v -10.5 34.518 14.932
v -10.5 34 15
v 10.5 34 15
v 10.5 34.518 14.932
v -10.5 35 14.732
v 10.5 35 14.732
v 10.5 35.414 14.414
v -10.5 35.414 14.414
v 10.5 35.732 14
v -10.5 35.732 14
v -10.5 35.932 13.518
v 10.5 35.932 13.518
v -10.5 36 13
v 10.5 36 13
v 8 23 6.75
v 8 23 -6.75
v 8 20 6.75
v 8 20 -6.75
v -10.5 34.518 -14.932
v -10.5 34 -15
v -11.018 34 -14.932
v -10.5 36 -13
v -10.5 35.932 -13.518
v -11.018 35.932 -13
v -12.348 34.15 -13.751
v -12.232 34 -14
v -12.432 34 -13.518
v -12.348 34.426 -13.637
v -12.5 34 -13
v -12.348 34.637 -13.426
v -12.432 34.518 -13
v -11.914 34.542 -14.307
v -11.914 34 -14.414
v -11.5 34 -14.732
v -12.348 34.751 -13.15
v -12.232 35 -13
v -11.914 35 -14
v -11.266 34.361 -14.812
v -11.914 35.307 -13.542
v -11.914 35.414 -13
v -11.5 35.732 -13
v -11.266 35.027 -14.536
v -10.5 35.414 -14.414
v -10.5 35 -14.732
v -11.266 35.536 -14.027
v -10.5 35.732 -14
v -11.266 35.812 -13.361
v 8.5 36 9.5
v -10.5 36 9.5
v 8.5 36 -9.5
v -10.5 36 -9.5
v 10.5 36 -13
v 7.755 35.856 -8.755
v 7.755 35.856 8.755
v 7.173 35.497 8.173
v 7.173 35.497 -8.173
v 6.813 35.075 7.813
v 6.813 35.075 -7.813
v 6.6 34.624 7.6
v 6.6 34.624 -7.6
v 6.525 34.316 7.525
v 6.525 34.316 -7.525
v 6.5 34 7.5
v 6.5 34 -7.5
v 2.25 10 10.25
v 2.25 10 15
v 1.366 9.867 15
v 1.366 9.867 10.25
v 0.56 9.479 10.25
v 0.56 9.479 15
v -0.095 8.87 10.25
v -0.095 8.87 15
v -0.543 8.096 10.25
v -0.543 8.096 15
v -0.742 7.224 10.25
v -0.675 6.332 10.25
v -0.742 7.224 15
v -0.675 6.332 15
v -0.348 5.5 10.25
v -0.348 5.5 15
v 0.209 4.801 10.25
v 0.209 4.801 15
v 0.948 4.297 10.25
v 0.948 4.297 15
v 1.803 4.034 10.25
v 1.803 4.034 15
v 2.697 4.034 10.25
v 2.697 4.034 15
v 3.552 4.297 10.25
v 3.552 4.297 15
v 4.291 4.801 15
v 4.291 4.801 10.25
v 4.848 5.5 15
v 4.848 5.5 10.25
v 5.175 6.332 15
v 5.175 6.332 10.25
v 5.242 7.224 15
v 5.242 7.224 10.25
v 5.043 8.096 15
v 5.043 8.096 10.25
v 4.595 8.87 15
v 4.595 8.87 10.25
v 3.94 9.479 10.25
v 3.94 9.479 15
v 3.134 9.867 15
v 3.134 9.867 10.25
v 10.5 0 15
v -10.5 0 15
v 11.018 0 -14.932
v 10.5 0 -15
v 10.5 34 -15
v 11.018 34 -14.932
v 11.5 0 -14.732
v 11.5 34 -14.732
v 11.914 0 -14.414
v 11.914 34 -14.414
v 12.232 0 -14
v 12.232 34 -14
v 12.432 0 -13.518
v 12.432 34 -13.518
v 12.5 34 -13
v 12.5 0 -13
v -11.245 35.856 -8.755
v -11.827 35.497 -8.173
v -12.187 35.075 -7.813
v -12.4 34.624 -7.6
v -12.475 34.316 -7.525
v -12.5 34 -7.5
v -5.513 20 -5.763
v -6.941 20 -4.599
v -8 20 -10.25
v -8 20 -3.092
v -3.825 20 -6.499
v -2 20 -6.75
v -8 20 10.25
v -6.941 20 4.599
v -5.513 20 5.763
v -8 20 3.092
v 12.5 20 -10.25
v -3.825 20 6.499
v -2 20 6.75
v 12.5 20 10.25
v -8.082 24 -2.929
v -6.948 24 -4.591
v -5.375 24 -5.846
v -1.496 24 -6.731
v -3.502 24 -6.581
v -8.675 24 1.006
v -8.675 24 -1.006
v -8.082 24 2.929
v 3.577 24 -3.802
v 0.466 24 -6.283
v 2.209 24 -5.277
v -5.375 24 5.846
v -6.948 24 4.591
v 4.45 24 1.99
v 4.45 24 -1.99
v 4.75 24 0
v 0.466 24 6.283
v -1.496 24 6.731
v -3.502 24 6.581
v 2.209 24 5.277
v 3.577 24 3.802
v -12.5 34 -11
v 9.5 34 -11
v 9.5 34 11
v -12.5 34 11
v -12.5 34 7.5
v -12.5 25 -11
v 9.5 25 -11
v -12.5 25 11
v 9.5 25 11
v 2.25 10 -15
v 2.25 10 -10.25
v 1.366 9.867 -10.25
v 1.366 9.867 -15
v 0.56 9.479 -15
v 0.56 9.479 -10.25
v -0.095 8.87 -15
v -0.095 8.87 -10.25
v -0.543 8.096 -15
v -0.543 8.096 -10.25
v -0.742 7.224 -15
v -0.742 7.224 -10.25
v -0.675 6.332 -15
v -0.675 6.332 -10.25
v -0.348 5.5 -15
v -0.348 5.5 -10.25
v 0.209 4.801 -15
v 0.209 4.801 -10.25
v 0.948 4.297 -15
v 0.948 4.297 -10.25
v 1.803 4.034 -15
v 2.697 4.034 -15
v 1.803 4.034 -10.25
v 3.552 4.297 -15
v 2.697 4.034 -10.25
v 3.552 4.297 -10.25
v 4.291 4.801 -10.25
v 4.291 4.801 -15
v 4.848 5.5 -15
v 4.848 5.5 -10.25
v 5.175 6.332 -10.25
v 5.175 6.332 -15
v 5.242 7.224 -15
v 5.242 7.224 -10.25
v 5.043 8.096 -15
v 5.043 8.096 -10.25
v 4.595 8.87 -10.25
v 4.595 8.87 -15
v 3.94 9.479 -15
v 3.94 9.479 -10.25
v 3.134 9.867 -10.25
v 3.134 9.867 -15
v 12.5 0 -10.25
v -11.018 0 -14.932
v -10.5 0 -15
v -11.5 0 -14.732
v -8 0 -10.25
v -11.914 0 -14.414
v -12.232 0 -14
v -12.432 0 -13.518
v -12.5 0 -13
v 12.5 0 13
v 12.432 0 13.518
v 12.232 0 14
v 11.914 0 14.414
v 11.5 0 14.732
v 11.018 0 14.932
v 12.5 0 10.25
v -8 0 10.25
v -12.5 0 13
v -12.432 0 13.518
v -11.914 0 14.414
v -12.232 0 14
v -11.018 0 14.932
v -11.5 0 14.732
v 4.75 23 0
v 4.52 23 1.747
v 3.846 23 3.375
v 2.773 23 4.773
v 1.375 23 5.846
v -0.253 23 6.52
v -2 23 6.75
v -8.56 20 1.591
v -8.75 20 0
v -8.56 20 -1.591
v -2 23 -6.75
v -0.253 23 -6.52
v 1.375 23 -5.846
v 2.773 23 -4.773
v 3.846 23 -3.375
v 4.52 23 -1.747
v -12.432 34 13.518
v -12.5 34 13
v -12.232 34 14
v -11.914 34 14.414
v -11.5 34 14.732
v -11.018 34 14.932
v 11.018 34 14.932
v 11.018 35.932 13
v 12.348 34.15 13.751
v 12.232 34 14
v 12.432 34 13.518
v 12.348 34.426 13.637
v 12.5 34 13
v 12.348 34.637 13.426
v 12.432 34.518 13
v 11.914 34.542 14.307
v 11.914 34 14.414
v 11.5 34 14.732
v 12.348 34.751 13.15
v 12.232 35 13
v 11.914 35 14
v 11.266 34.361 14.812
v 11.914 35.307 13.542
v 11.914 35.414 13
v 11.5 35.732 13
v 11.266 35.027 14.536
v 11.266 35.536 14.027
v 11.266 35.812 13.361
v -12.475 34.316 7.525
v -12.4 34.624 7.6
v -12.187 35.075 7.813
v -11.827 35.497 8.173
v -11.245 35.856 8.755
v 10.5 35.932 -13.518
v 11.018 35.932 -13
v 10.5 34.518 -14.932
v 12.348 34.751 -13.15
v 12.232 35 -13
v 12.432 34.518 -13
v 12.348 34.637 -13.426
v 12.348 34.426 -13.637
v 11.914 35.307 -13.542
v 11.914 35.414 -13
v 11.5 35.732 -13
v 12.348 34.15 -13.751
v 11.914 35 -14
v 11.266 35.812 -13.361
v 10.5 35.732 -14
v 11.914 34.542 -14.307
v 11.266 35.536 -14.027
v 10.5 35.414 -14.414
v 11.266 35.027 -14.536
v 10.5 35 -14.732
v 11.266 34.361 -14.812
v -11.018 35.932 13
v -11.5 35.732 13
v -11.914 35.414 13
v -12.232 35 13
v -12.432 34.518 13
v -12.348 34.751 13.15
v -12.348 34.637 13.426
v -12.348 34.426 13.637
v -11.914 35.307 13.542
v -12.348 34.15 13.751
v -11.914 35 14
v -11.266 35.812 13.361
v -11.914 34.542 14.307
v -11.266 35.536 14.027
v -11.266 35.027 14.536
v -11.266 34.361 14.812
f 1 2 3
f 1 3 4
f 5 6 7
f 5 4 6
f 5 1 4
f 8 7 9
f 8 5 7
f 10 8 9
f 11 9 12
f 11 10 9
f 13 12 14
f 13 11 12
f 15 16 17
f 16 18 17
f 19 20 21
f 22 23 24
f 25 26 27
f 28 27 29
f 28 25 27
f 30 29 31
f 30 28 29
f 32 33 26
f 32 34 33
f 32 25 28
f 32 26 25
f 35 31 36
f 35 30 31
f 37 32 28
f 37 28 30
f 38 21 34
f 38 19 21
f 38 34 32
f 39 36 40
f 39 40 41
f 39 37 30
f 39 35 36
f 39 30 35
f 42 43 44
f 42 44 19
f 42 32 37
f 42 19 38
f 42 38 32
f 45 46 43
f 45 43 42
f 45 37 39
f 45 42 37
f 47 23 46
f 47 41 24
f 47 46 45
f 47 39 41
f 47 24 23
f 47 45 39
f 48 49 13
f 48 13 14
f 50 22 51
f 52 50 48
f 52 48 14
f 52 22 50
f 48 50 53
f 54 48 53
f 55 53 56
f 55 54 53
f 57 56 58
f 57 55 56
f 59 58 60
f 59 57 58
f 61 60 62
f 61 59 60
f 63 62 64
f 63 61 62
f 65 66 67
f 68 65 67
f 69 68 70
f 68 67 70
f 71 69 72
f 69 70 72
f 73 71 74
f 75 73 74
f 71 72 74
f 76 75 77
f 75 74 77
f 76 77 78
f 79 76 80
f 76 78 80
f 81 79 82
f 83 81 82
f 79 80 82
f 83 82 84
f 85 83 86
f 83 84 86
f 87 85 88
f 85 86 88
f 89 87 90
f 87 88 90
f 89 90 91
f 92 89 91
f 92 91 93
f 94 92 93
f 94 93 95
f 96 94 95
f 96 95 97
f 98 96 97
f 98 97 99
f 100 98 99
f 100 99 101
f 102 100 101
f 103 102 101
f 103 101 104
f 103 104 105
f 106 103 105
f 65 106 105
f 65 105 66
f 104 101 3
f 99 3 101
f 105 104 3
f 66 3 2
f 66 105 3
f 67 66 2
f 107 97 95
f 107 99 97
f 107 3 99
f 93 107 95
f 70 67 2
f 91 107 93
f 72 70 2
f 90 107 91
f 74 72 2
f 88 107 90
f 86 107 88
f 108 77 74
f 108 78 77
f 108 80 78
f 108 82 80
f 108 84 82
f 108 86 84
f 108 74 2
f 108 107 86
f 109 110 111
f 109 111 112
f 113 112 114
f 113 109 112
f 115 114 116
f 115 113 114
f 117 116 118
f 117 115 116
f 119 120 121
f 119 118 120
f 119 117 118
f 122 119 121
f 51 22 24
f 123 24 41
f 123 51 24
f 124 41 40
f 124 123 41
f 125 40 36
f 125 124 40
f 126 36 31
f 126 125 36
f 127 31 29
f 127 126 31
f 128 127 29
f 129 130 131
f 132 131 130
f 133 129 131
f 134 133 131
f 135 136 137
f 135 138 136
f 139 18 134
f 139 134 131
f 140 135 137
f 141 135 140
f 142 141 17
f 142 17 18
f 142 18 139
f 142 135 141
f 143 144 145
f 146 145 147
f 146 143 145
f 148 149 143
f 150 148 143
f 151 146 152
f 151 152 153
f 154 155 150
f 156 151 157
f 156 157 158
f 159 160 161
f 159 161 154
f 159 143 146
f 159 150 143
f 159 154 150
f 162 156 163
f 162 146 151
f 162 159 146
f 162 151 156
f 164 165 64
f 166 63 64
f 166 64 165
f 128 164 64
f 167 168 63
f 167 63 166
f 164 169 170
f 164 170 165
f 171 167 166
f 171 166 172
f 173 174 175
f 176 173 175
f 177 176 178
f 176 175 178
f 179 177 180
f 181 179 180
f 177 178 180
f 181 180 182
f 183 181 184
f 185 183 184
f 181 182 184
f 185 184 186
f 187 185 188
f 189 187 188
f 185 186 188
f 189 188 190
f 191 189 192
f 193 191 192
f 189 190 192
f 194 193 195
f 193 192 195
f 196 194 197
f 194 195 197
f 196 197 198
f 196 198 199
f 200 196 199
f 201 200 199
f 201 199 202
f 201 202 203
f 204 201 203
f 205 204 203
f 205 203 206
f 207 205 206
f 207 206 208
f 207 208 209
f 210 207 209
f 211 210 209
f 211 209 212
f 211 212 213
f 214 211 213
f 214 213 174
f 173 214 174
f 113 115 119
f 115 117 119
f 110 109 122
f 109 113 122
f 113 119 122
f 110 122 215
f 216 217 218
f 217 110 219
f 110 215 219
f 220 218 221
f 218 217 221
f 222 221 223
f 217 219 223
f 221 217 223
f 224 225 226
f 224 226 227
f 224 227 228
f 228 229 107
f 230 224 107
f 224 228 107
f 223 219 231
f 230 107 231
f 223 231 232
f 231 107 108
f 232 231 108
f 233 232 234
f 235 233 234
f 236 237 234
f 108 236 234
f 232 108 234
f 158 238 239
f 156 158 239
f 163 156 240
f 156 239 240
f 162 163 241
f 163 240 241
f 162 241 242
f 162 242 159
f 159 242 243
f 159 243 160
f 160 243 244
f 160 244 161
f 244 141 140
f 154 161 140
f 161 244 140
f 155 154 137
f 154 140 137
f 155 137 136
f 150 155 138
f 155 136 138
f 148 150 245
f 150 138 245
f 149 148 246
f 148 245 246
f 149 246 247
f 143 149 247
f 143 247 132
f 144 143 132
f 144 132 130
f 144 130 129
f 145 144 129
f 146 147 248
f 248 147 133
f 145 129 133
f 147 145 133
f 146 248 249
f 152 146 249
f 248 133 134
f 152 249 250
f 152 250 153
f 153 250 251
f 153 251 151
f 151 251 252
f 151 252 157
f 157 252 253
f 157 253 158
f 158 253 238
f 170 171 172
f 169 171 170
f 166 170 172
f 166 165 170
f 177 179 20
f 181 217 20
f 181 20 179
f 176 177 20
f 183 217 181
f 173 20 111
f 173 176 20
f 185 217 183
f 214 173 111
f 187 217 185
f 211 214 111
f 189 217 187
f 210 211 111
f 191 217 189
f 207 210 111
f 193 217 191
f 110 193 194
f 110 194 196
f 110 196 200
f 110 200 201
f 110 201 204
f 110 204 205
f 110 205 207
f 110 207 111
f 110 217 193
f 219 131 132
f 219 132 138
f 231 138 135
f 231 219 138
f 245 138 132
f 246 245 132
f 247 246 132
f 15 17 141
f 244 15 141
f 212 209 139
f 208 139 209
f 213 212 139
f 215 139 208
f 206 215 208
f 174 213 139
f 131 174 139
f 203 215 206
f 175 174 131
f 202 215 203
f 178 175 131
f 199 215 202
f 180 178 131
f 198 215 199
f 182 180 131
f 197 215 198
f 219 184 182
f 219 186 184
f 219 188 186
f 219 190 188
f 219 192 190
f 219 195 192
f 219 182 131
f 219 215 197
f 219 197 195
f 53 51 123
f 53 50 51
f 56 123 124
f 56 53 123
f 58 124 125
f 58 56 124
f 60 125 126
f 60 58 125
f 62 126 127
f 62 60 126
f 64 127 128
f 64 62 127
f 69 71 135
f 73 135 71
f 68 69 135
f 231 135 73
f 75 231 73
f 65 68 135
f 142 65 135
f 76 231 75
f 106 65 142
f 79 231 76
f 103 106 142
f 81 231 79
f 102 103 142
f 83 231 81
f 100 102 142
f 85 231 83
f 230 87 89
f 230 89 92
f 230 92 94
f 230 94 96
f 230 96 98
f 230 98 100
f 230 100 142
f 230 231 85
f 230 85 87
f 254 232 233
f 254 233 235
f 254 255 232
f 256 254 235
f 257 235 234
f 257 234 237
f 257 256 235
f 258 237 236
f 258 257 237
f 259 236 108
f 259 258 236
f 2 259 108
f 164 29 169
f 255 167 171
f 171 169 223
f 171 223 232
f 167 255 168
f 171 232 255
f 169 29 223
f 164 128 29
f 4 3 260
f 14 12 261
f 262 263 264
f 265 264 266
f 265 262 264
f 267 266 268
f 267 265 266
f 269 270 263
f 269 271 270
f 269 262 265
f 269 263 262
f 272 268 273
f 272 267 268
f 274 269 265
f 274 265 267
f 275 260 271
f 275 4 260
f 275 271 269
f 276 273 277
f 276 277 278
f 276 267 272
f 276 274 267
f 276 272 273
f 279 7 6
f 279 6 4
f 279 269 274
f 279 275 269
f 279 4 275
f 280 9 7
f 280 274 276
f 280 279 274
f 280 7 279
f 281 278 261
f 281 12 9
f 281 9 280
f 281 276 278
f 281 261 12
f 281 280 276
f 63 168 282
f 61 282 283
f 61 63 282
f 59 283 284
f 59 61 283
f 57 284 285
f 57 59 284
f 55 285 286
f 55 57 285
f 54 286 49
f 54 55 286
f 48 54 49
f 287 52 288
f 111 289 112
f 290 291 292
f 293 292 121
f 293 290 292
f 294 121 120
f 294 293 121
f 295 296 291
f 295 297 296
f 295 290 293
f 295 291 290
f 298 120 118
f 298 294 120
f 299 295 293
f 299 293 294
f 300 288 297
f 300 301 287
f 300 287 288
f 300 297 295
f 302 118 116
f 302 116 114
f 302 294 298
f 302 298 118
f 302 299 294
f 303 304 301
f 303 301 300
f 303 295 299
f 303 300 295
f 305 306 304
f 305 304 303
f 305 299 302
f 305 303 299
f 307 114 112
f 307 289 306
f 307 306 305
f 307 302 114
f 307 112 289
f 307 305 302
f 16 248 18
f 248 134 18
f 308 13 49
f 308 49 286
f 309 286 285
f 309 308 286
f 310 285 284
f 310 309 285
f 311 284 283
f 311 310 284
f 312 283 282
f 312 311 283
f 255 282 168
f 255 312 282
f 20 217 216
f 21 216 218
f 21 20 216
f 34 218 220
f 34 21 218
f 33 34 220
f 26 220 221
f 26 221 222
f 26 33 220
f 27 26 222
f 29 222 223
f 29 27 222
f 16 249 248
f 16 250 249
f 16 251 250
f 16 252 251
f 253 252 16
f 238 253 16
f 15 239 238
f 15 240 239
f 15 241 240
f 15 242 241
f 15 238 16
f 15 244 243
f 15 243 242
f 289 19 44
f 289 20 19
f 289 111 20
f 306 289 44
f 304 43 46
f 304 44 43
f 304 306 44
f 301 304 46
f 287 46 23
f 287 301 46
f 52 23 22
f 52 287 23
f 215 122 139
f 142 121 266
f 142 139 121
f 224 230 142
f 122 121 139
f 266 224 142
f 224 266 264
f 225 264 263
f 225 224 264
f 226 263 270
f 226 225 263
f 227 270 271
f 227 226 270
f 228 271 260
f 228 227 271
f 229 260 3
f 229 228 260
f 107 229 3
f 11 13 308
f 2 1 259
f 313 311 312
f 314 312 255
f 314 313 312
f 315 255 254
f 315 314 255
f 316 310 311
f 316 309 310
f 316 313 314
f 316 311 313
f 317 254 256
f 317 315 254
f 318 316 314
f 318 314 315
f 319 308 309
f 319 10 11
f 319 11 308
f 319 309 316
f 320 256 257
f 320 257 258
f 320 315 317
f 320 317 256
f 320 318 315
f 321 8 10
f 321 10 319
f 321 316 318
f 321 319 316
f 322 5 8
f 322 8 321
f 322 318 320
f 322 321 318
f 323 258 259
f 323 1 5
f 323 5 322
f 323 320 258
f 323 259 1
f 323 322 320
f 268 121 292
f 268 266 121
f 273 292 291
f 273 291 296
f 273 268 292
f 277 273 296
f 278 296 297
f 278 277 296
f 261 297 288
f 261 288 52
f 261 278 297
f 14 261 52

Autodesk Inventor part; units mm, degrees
ref_plane "YZ Plane" through (0, 0, 0) normal (1, 0, 0) x (0, 1, 0)
ref_plane "XZ Plane" through (0, 0, 0) normal (0, 1, 0) x (-1, 0, 0)
ref_plane "XY Plane" through (0, 0, 0) normal (0, 0, 1) x (1, 0, 0)
sketch "スケッチ1" plane through (0, 0, 0) normal (0, 1, 0) x (-1, 0, 0)
  line L0 (-12.5, -15) -> (12.5, -15)
  line L1 (12.5, -15) -> (12.5, 15)
  line L2 (12.5, 15) -> (-12.5, 15)
  line L3 (-12.5, 15) -> (-12.5, -15)
  line L4 (-12.5, -15) -> (12.5, 15) construction
  line L5 (12.5, -15) -> (-12.5, 15) construction
  point P0 (0, 0)
  dimension "d0" = 25
  dimension "d1" = 30
extrude "押し出し1" add sketch "スケッチ1" along normal blind 25
sketch "スケッチ2" plane through (0, 0, 0) normal (0, -1, 0) x (1, 0, 0)
  line L0 (12.5, 15) -> (12.5, -15) projected
  line L1 (12.5, -10.25) -> (-8, -10.25)
  line L2 (-8, -10.25) -> (-8, 10.25)
  line L3 (-8, 10.25) -> (12.5, 10.25)
  line L4 (12.5, 10.25) -> (12.5, -10.25)
  line L5 (12.5, -15) -> (-12.5, -15) projected
  point P0 (0, 0)
  point P1 (12.5, 10.25)
  dimension "d4" = 20.5
  dimension "d5" = 20.5
  dimension "d22" = 10.25
extrude "押し出し2" cut sketch "スケッチ2" against normal blind 20
sketch "スケッチ4" plane through (12.5, 0, -15) normal (0, 0, -1) x (-1, 0, 0)
  line L0 (0, 0) -> (25, 0) projected
  line L1 (0, 0) -> (0, 25) projected
  point P0 (12.5, 0)
  point P1 (10.25, 7)
  dimension "d12" = 7
  dimension "d13" = 10.25
hole "穴1" at (2.25, 7, -15) direction (0, 0, 1) diameter 6 end through all
sketch "スケッチ5" plane through (0, 20, 0) normal (0, -1, 0) x (1, 0, 0)
  circle A0 centre (-2, 0) radius 6.75
  line L0 (12.5, 10.25) -> (12.5, -10.25) projected
  line L1 (-8, 10.25) -> (12.5, 10.25) projected
  line L2 (-12.5, -15) -> (-12.5, 15) projected
  point P0 (0, 0)
  dimension "d24" = 13.5
  dimension "d26" = 10.25
  dimension "d49" = 10.5
extrude "押し出し4" cut sketch "スケッチ5" against normal blind 4
sketch "スケッチ6" plane through (0, 25, 0) normal (0, 1, 0) x (1, 0, 0)
  line L0 (-12.5, 15) -> (-12.5, -15) projected
  line L1 (12.5, -15) -> (12.5, -10.25) projected
  line L2 (-12.5, 15) -> (12.5, 15)
  line L3 (12.5, 15) -> (12.5, -15)
  line L4 (12.5, -15) -> (-12.5, -15)
  line L5 (-12.5, -15) -> (-12.5, 15)
  point P0 (0, 0)
extrude "押し出し5" add sketch "スケッチ6" along normal blind 11
sketch "スケッチ8" plane through (-12.5, 0, -15) normal (-1, 0, 0) x (0, 0, 1)
  point P0 (15, 0)
sketch "スケッチ9" plane through (-12.5, 0, -15) normal (-1, 0, 0) x (0, 0, 1)
  line L0 (4, 34) -> (26, 34)
  line L1 (26, 34) -> (26, 25)
  line L2 (26, 25) -> (4, 25)
  line L3 (4, 25) -> (4, 34)
  line L4 (0, 36) -> (30, 36) projected
  point P0 (15, 0)
  dimension "d37" = 22
  dimension "d38" = 9
  dimension "d39" = 2
  dimension "d40" = 11
extrude "押し出し7" cut sketch "スケッチ9" against normal blind 22
sketch "スケッチ10" plane through (-12.5, 0, -15) normal (-1, 0, 0) x (0, 0, 1)
  line L0 (7.5, 36) -> (22.5, 36)
  line L1 (22.5, 36) -> (22.5, 34)
  line L2 (22.5, 34) -> (7.5, 34)
  line L3 (7.5, 34) -> (7.5, 36)
  line L4 (0, 36) -> (30, 36) projected
  point P0 (15, 0)
  dimension "d43" = 15
  dimension "d44" = 2
  dimension "d45" = 0
  dimension "d46" = 7.5
extrude "押し出し8" cut sketch "スケッチ10" against normal blind 19
sketch "スケッチ12" plane through (0, 20, 0) normal (0, -1, 0) x (1, 0, 0)
  circle A0 centre (-2, 0) radius 6.75 projected
  line L0 (-2, 6.75) -> (-2, -6.75)
  line L1 (-2, -6.75) -> (8, -6.75)
  line L2 (8, -6.75) -> (8, 6.75)
  line L3 (8, 6.75) -> (-2, 6.75)
  point P0 (0, 0)
  dimension "d50" = 10
extrude "押し出し9" cut sketch "スケッチ12" against normal blind 3 contours A0 L3 L2 L1
fillet "フィレット3" radius 2 12 edges at (0, 36, -15) (-3, 36, -7.5) (-12.5, 36, -11.25) (6.5, 36, 0) (-3, 36, 7.5) (0, 36, 15) (-12.5, 36, 11.25) (12.5, 36, 0) (12.5, 18, -15) (12.5, 18, 15) (-12.5, 18, 15) (-12.5, 18, -15)
properties part number "baseA"
